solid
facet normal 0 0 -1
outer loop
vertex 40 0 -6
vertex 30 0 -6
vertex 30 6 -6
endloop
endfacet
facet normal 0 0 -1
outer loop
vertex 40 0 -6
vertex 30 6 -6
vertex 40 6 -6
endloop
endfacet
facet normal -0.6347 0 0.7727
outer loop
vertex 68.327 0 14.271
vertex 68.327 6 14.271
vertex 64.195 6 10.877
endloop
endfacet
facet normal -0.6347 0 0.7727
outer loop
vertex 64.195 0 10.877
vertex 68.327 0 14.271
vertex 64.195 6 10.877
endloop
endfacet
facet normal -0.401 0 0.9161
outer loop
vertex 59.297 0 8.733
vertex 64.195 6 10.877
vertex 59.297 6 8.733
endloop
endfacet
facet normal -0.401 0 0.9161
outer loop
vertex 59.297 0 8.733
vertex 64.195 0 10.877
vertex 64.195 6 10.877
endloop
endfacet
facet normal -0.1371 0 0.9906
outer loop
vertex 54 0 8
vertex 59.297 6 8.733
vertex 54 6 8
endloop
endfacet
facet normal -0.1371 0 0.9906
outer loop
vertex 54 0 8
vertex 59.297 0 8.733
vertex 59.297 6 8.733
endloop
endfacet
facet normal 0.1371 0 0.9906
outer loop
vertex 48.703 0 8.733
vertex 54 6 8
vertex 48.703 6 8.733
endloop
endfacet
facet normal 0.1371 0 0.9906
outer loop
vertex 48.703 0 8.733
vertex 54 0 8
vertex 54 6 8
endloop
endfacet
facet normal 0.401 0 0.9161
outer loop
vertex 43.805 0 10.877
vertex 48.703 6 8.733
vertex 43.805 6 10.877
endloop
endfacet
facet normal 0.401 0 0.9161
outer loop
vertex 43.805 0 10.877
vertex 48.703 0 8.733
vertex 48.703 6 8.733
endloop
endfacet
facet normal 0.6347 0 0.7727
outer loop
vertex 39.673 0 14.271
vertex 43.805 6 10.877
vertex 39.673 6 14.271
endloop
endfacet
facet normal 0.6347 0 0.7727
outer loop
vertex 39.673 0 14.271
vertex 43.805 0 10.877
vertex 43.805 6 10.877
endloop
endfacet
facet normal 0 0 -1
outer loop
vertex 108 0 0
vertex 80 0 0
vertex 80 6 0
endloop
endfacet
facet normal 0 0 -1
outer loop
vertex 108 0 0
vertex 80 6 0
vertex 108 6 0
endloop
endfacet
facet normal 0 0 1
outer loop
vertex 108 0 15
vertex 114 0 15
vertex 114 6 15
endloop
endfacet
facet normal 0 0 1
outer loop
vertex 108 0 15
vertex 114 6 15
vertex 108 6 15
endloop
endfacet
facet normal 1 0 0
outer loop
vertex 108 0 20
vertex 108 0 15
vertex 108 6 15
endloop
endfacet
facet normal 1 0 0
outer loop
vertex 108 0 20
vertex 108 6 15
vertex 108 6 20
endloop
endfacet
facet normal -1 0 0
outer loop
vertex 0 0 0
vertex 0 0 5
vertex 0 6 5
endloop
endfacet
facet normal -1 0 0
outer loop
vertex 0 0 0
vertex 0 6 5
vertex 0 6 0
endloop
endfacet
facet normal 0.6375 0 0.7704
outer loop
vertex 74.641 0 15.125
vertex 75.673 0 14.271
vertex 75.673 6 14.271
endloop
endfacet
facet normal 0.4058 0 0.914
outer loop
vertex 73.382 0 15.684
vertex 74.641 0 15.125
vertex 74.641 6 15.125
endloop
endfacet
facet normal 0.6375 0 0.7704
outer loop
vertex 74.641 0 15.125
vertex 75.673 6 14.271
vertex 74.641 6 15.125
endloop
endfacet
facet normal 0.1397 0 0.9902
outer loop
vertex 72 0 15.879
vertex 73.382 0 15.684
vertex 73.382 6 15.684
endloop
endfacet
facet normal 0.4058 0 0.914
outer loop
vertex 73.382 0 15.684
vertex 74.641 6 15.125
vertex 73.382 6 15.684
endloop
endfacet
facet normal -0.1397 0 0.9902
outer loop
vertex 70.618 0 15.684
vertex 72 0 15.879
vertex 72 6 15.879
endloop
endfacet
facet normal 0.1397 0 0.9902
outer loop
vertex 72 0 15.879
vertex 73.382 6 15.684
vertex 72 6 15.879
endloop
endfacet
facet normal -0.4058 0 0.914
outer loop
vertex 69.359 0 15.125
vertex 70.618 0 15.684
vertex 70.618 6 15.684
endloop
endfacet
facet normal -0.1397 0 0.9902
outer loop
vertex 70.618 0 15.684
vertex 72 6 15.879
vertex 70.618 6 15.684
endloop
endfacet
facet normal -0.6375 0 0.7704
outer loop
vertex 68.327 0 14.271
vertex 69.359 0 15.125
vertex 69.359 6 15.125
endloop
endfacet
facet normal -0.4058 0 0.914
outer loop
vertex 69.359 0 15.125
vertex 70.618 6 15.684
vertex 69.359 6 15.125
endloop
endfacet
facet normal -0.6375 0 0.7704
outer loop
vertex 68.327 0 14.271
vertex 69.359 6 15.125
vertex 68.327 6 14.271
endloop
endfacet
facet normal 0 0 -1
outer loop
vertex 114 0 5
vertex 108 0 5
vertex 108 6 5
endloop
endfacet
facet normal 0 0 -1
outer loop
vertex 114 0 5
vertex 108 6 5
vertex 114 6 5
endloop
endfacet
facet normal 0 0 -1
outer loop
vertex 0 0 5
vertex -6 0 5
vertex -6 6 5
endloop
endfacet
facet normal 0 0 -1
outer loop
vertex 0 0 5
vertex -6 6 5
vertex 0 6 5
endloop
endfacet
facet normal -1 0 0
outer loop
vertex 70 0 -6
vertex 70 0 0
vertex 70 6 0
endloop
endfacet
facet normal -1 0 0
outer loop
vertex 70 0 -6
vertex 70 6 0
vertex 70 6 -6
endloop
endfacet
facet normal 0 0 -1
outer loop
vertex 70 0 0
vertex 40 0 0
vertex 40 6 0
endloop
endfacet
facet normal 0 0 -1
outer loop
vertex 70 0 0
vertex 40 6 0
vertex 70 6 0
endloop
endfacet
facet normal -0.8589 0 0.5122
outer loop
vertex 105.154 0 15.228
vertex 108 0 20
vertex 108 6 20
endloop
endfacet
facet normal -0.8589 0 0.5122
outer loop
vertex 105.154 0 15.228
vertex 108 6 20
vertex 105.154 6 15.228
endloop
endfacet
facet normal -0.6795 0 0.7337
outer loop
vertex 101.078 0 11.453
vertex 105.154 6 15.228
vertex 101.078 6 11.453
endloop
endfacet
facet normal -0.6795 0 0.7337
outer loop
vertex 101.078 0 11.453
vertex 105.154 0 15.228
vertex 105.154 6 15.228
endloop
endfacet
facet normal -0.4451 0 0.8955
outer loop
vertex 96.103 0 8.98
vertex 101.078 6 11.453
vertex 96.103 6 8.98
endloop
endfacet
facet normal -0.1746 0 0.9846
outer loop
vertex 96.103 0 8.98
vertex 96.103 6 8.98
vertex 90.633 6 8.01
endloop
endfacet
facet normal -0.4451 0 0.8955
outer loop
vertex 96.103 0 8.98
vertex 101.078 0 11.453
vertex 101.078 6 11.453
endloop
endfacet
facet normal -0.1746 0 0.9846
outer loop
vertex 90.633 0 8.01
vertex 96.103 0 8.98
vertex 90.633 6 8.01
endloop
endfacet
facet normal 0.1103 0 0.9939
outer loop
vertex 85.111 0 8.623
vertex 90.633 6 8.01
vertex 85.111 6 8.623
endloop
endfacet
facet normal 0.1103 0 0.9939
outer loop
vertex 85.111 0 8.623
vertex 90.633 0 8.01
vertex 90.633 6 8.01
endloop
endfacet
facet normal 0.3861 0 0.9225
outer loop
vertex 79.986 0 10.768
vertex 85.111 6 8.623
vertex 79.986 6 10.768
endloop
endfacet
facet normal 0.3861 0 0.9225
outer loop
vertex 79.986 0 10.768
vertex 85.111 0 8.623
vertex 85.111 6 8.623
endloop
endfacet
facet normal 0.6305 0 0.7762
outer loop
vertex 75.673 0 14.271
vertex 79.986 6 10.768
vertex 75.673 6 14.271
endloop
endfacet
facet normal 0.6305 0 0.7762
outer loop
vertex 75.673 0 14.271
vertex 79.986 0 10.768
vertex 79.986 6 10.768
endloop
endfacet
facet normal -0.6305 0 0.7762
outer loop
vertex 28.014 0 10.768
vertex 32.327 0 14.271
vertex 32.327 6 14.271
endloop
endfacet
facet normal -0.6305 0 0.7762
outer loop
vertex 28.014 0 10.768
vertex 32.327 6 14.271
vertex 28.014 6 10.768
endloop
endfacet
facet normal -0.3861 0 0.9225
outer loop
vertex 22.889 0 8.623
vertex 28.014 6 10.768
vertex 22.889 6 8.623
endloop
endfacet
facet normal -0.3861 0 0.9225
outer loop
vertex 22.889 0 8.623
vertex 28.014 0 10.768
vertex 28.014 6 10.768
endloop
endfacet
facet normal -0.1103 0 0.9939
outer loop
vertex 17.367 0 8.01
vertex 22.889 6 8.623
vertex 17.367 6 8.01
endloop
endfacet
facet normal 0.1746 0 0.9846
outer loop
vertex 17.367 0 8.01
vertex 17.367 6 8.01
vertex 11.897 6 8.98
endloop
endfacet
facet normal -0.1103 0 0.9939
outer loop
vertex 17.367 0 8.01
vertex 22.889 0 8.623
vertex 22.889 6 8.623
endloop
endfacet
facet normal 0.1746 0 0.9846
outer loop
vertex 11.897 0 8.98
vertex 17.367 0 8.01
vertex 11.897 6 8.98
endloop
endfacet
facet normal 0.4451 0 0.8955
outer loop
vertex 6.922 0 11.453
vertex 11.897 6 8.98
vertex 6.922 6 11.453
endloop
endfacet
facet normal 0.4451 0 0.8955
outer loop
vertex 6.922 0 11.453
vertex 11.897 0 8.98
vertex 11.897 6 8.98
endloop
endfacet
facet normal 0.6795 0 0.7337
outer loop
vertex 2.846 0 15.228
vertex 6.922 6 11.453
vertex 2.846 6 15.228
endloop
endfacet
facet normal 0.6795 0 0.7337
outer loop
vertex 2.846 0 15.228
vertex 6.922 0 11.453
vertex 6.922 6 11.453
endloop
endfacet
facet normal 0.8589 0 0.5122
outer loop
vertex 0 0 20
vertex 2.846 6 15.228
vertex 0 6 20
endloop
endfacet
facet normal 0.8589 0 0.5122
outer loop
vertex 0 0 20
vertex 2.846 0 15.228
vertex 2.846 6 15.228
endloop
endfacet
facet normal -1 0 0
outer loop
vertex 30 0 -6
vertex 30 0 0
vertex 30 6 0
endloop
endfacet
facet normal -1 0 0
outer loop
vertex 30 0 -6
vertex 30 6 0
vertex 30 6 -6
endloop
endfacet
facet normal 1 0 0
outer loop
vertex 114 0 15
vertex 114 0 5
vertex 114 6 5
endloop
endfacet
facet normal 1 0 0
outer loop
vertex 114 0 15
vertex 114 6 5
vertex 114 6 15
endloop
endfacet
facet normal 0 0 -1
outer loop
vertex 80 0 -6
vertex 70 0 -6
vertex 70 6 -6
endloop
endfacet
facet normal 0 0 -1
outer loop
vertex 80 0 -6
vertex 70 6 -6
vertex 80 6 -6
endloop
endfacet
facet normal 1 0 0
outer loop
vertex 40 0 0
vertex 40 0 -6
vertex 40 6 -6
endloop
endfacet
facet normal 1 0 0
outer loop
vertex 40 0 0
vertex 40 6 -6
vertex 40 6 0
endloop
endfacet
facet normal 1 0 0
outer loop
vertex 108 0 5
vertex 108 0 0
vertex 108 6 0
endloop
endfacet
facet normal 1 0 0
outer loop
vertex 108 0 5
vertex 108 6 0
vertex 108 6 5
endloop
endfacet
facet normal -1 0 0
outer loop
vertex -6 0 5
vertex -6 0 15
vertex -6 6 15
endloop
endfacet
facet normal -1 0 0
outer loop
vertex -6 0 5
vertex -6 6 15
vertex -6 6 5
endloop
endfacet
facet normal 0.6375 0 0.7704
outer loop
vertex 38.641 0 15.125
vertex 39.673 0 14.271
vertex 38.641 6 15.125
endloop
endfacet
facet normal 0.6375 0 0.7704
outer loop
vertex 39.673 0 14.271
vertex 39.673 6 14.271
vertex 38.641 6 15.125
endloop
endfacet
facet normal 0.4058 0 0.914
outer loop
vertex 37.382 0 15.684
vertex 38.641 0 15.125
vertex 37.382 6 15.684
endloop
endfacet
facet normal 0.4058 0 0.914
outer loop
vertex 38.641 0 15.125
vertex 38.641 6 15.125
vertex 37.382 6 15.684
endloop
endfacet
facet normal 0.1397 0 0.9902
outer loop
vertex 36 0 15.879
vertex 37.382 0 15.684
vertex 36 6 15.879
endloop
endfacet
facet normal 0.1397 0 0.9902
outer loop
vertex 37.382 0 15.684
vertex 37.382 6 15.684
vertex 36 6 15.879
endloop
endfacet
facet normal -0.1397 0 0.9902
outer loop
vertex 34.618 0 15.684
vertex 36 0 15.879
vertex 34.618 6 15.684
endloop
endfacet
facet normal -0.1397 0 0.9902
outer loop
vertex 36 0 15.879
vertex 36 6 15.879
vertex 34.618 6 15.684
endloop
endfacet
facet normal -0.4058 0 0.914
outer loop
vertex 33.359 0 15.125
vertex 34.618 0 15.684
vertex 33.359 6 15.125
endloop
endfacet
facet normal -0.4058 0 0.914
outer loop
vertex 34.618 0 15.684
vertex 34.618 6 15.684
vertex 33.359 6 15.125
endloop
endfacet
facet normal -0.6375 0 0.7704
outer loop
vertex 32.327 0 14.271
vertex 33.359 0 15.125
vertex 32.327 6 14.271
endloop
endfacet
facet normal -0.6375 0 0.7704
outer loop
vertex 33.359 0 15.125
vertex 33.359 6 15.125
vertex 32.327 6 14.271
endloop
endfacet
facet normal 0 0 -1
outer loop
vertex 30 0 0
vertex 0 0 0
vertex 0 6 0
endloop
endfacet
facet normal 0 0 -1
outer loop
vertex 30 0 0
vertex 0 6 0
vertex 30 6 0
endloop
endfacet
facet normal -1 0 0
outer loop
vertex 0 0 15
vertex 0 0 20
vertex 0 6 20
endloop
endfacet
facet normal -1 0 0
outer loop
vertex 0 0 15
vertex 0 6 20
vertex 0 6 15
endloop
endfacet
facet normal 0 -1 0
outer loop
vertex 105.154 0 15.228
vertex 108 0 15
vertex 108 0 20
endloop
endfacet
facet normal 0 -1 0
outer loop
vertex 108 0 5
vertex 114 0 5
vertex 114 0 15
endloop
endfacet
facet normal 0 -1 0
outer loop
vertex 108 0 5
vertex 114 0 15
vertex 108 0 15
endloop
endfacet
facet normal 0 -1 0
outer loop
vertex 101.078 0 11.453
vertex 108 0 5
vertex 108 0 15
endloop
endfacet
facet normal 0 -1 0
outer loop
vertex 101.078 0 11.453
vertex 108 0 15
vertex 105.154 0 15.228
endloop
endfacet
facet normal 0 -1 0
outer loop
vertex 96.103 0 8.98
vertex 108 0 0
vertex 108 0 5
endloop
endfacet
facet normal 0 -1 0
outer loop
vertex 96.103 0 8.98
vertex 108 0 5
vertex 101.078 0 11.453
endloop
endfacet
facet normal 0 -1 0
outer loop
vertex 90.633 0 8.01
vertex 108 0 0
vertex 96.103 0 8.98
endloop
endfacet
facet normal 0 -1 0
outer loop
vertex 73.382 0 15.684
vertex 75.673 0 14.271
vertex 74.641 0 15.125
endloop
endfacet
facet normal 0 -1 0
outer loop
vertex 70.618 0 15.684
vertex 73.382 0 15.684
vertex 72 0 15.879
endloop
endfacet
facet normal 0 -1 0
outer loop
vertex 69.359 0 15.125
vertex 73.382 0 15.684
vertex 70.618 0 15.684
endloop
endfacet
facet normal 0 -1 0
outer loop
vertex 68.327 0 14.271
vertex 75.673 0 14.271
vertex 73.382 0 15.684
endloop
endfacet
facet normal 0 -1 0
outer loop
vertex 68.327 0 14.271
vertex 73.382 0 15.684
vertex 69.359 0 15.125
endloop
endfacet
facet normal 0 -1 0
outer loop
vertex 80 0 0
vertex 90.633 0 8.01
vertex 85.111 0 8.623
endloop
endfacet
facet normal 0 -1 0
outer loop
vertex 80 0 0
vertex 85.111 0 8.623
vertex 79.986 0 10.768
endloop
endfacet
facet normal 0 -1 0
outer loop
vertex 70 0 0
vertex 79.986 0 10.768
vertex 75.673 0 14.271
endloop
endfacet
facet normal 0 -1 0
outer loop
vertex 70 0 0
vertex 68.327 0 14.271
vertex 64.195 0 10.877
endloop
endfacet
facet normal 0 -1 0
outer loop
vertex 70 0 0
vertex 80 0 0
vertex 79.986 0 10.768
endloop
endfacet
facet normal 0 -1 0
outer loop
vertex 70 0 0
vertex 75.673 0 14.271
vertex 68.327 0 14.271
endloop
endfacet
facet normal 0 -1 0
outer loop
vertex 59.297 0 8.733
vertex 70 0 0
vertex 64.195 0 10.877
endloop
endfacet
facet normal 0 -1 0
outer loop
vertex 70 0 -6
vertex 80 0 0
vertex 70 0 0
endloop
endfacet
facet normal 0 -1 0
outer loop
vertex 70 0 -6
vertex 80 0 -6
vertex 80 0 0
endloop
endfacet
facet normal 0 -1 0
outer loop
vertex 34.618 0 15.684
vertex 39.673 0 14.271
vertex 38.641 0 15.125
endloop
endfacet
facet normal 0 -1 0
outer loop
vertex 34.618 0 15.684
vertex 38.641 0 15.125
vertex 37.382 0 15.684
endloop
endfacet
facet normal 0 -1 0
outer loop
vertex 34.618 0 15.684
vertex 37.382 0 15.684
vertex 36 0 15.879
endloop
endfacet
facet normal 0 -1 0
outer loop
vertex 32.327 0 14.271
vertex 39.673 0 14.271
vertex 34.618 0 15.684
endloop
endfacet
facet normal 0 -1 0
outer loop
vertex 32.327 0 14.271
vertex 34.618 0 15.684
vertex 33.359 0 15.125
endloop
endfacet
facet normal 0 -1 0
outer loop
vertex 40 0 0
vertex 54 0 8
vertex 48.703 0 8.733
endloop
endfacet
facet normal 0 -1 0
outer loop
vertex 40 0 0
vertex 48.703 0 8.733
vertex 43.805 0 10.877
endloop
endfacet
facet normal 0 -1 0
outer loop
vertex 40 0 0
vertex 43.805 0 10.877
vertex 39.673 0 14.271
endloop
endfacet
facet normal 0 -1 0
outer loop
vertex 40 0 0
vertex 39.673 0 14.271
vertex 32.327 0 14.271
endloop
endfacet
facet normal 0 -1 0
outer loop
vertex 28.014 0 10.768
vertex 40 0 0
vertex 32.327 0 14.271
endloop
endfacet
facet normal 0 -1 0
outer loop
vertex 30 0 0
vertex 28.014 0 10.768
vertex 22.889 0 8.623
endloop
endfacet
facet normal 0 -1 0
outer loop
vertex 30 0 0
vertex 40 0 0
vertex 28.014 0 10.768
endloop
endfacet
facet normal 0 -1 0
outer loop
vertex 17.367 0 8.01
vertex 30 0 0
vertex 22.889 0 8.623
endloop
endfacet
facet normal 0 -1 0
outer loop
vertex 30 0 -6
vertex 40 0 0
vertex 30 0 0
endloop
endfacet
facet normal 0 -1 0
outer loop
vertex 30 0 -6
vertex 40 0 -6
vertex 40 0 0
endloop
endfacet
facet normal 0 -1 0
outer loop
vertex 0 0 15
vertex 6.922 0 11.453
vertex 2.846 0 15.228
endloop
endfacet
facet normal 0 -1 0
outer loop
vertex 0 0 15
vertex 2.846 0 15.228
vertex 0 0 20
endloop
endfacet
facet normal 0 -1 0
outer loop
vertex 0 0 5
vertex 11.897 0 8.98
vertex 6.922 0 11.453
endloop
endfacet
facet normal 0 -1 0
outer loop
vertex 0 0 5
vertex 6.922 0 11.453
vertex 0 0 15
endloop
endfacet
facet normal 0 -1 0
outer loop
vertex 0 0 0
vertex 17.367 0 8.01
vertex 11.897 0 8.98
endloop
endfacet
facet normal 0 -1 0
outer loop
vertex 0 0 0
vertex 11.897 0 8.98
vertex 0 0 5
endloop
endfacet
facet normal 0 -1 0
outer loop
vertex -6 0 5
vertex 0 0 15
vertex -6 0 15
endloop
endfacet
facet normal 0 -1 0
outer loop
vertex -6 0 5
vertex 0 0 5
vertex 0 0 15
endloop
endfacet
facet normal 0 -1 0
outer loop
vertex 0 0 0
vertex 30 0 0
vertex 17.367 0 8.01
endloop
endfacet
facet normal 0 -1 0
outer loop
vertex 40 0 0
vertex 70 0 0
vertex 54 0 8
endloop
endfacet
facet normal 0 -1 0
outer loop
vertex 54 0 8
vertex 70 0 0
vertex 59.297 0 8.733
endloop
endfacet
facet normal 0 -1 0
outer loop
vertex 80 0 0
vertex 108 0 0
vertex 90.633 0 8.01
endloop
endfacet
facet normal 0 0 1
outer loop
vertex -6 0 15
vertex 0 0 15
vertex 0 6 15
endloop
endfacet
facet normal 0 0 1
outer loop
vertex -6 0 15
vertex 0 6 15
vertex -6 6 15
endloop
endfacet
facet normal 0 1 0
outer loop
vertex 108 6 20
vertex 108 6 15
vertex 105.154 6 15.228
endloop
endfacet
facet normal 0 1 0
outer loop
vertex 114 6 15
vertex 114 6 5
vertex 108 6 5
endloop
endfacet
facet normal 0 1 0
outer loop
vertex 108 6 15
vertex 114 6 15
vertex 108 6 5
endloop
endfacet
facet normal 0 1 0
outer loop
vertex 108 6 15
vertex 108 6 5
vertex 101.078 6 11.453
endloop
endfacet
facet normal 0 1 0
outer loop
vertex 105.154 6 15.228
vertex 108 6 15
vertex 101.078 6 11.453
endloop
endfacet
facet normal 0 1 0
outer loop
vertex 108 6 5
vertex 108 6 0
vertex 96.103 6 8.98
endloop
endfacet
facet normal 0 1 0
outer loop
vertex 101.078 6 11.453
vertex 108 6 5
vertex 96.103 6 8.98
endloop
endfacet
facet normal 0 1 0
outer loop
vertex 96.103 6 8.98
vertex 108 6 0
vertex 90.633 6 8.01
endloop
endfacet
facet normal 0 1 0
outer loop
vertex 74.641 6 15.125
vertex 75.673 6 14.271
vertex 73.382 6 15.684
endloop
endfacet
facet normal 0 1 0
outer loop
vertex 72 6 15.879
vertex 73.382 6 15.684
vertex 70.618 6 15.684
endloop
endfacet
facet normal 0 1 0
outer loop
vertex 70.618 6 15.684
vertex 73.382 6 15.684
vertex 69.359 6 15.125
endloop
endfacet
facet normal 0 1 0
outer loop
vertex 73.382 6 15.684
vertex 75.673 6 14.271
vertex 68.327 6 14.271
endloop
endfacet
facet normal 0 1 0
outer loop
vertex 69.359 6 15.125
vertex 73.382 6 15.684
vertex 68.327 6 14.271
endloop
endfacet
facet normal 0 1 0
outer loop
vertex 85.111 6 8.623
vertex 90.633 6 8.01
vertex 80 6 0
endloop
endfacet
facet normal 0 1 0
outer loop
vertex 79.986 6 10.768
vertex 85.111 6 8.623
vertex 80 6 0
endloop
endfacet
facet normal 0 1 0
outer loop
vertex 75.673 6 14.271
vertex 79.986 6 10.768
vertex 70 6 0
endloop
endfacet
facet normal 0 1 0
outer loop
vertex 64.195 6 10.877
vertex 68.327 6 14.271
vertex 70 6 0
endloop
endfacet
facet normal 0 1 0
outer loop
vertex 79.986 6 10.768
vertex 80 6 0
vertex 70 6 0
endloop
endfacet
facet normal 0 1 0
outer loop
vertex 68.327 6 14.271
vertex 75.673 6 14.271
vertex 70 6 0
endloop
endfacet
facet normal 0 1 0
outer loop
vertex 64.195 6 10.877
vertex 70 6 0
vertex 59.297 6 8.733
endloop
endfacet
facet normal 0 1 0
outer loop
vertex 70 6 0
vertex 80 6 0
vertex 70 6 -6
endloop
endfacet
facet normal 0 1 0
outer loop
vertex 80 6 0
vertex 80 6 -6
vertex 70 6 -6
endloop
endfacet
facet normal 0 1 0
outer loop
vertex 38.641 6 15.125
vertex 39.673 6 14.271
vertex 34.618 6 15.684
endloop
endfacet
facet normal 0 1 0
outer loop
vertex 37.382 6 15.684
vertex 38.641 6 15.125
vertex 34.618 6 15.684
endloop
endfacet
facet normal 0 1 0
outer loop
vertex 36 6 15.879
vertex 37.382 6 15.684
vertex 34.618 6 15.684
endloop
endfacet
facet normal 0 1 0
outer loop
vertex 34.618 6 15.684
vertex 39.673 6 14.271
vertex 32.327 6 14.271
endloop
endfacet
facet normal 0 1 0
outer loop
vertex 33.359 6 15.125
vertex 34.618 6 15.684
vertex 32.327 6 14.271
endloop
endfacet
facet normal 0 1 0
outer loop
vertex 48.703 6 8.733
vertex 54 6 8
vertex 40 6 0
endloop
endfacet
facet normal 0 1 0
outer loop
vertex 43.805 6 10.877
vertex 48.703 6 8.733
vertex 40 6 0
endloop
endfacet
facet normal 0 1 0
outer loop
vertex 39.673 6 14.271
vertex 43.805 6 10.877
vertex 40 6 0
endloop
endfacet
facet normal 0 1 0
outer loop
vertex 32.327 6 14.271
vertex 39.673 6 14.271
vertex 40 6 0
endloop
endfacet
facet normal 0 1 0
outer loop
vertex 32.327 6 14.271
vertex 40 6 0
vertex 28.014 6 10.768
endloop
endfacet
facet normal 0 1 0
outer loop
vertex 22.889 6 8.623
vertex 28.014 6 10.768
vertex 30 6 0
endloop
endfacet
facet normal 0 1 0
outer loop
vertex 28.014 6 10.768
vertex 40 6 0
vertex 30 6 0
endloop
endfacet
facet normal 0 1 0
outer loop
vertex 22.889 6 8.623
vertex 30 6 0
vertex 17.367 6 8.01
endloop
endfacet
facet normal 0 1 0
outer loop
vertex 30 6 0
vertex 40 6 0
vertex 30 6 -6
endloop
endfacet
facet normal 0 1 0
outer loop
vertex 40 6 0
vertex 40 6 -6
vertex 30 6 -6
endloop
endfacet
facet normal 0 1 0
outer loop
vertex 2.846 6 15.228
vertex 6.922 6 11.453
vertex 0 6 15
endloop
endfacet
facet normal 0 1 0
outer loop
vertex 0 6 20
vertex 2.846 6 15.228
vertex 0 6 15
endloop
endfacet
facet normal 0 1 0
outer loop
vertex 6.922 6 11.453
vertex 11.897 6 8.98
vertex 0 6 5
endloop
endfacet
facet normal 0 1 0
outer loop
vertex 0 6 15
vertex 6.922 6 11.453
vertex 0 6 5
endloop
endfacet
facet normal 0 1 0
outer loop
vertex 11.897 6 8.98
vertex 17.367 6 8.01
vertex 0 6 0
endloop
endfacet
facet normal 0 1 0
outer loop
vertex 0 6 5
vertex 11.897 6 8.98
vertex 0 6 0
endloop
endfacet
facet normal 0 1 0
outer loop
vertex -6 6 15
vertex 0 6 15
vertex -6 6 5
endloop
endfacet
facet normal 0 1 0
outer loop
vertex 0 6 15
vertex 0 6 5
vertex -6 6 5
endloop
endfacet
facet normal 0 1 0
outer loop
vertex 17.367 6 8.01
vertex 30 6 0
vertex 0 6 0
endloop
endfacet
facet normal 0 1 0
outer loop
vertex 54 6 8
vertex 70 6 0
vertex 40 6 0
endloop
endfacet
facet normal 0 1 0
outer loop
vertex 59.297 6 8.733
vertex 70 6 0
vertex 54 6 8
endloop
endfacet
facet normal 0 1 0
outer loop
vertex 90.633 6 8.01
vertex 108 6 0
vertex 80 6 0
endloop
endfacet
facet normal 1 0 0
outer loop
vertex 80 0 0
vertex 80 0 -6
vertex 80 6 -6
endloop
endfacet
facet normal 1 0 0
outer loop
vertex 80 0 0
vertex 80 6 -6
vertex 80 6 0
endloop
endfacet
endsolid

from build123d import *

# Parameters (mm, degrees)
BOSS_EXTRUDE1_DEPTH = 6
FILLET1_R           = 5


with BuildPart() as part:
    # Sketch1 → Boss-Extrude1 (new body)
    with BuildSketch(Plane(origin=(0, 0, 0), x_dir=(1, 0, 0), z_dir=(0, 1, 0))):
        with BuildLine():
            Line((0, 0), (30, 0))
            Line((30, 0), (30, 6))
            Line((30, 6), (40, 6))
            Line((40, 6), (40, 0))
            Line((40, 0), (70, 0))
            Line((70, 0), (70, 6))
            Line((70, 6), (80, 6))
            Line((80, 6), (80, 0))
            Line((80, 0), (108, 0))
            Line((108, 0), (108, -5))
            Line((108, -5), (114, -5))
            Line((114, -5), (114, -15))
            Line((114, -15), (108, -15))
            Line((108, -15), (108, -20))
            ThreePointArc((108, -20), (90, -8), (72, -20))
            ThreePointArc((72, -20), (54, -8), (36, -20))
            ThreePointArc((36, -20), (18, -8), (0, -20))
            Line((0, -20), (0, -15))
            Line((0, -15), (-6, -15))
            Line((-6, -15), (-6, -5))
            Line((-6, -5), (0, -5))
            Line((0, -5), (0, 0))
        make_face()
    extrude(amount=BOSS_EXTRUDE1_DEPTH)

    # Fillet1
    fillet1_edges = [part.edges().sort_by_distance(p)[0] for p in [
        (72, 3, 20),
        (36, 3, 20),
    ]]
    fillet(fillet1_edges, radius=FILLET1_R)


solid = part.part
